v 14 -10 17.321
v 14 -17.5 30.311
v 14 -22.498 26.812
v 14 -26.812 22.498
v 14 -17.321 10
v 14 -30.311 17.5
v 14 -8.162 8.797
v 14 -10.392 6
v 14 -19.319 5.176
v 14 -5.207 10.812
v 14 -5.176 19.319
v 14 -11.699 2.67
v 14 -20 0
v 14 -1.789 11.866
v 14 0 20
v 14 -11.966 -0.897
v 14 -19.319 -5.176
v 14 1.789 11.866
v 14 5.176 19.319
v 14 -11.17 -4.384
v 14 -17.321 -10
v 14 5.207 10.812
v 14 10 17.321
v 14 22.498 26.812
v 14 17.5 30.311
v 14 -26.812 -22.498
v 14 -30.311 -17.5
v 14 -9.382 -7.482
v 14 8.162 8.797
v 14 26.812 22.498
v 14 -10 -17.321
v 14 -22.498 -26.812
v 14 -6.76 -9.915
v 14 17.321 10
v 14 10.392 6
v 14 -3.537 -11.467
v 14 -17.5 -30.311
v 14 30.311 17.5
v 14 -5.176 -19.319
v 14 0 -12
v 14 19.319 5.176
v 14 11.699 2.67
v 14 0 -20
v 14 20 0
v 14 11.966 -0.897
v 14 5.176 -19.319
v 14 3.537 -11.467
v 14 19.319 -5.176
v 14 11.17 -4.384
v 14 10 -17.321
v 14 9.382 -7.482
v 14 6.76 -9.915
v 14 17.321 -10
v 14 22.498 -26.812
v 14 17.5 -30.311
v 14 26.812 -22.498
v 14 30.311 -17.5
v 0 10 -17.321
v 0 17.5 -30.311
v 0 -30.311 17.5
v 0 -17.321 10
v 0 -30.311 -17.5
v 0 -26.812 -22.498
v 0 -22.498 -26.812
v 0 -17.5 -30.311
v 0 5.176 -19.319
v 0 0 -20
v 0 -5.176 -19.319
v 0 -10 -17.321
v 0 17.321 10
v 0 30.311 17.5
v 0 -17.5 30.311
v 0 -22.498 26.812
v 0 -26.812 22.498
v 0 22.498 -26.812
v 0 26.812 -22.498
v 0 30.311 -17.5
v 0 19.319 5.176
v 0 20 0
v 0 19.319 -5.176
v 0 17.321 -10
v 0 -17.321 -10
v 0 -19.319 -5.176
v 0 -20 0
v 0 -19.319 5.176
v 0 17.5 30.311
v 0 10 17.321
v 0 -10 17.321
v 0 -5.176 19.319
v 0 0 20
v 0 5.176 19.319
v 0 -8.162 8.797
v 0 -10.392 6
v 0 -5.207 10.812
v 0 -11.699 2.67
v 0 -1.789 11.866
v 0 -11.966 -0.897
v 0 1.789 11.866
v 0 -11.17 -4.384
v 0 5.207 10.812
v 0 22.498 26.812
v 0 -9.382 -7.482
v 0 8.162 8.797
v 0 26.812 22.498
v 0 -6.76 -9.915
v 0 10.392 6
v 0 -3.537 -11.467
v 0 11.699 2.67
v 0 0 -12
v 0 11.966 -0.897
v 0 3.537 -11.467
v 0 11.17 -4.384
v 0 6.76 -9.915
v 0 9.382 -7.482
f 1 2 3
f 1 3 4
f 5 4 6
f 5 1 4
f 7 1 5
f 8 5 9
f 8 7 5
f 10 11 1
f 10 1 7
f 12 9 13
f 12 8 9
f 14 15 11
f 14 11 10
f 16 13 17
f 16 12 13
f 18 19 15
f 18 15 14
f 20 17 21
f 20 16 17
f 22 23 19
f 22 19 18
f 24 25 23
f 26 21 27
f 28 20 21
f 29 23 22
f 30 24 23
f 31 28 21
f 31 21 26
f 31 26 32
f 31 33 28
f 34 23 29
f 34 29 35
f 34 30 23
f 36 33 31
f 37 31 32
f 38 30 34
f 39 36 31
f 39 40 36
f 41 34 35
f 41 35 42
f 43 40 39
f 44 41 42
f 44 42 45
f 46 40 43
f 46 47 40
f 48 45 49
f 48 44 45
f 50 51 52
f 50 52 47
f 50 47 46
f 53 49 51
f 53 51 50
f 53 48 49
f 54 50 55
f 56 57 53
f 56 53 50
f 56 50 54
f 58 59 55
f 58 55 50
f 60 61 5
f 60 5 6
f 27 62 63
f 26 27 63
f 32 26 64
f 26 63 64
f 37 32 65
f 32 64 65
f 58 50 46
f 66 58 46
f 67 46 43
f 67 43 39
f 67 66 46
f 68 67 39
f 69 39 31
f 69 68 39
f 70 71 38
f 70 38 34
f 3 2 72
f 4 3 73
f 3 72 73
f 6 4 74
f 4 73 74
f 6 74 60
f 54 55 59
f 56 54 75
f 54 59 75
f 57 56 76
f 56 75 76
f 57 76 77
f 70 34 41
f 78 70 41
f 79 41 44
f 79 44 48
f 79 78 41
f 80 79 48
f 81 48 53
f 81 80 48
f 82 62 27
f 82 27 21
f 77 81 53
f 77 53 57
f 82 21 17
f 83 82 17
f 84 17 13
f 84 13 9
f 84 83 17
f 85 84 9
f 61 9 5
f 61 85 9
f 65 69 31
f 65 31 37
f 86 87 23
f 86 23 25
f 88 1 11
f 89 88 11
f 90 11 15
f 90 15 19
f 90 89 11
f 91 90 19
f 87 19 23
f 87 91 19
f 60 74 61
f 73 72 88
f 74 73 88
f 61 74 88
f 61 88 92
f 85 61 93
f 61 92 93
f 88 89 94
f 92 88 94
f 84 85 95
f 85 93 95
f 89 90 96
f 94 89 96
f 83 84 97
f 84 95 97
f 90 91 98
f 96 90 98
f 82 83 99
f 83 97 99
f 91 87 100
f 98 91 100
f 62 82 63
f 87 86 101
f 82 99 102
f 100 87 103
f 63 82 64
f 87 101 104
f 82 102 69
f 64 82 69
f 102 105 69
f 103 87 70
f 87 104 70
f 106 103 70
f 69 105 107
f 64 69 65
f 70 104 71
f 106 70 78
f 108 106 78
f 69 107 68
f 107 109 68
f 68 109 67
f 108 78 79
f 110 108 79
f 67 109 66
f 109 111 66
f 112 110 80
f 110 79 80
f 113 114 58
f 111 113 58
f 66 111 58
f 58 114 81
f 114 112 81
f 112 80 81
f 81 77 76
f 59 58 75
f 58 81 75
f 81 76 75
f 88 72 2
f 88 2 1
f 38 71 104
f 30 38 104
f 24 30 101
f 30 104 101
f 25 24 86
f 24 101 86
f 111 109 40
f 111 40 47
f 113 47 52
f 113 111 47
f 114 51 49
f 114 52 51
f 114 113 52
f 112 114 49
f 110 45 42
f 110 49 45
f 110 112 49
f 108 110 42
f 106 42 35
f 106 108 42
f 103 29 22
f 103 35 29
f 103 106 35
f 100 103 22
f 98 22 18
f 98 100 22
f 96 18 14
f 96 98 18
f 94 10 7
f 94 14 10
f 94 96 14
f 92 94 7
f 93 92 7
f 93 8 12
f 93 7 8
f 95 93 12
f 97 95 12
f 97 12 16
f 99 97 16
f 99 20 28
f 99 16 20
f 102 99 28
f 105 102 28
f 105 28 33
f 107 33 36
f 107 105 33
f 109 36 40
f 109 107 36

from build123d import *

# Parameters (mm, degrees)
SKETCH1_R               = 35
BOSS_EXTRUDE1_DEPTH     = 14
CUT_EXTRUDE1_DEPTH      = 52.439284598
CUT_EXTRUDE2_DEPTH      = 46.094345544
CUT_EXTRUDE2_DEPTH_BACK = 46.094345544
SKETCH3_R               = 12


with BuildPart() as part:
    # Sketch1 → Boss-Extrude1 (new body)
    with BuildSketch(Plane(origin=(0, 0, 0), x_dir=(0, 0, -1), z_dir=(1, 0, 0))):
        Circle(SKETCH1_R)
    extrude(amount=BOSS_EXTRUDE1_DEPTH)

    # Sketch2 → Cut-Extrude1 (cut, through all)
    with BuildSketch(Plane(origin=(0, 0, 0), x_dir=(0, 0, -1), z_dir=(1, 0, 0))):
        with BuildLine():
            Line((-17.5, 30.310889132), (-10, 17.320508076))
            ThreePointArc((-10, 17.320508076), (0, 20), (10, 17.320508076))
            Line((10, 17.320508076), (17.5, 30.310889132))
            ThreePointArc((17.5, 30.310889132), (0, 35), (-17.5, 30.310889132))
        make_face()
        with BuildLine():
            Line((30.310889132, 17.5), (17.320508076, 10))
            ThreePointArc((17.320508076, 10), (20, 0), (17.320508076, -10))
            Line((17.320508076, -10), (30.310889132, -17.5))
            ThreePointArc((30.310889132, -17.5), (35, 0), (30.310889132, 17.5))
        make_face()
        with BuildLine():
            Line((17.5, -30.310889132), (10, -17.320508076))
            ThreePointArc((10, -17.320508076), (0, -20), (-10, -17.320508076))
            Line((-10, -17.320508076), (-17.5, -30.310889132))
            ThreePointArc((-17.5, -30.310889132), (0, -35), (17.5, -30.310889132))
        make_face()
        with BuildLine():
            Line((-30.310889132, -17.5), (-17.320508076, -10))
            ThreePointArc((-17.320508076, -10), (-20, 0), (-17.320508076, 10))
            Line((-17.320508076, 10), (-30.310889132, 17.5))
            ThreePointArc((-30.310889132, 17.5), (-35, 0), (-30.310889132, -17.5))
        make_face()
    extrude(amount=CUT_EXTRUDE1_DEPTH, mode=Mode.SUBTRACT)

    # Sketch3 → Cut-Extrude2 (cut, two sides: drawn at the far end of the back side and taken through both)
    with BuildSketch(Plane(origin=(0, 0, 0), x_dir=(0, 0, -1), z_dir=(1, 0, 0)).offset(-CUT_EXTRUDE2_DEPTH_BACK)):
        Circle(SKETCH3_R)
    extrude(amount=CUT_EXTRUDE2_DEPTH + CUT_EXTRUDE2_DEPTH_BACK, mode=Mode.SUBTRACT)


solid = part.part
